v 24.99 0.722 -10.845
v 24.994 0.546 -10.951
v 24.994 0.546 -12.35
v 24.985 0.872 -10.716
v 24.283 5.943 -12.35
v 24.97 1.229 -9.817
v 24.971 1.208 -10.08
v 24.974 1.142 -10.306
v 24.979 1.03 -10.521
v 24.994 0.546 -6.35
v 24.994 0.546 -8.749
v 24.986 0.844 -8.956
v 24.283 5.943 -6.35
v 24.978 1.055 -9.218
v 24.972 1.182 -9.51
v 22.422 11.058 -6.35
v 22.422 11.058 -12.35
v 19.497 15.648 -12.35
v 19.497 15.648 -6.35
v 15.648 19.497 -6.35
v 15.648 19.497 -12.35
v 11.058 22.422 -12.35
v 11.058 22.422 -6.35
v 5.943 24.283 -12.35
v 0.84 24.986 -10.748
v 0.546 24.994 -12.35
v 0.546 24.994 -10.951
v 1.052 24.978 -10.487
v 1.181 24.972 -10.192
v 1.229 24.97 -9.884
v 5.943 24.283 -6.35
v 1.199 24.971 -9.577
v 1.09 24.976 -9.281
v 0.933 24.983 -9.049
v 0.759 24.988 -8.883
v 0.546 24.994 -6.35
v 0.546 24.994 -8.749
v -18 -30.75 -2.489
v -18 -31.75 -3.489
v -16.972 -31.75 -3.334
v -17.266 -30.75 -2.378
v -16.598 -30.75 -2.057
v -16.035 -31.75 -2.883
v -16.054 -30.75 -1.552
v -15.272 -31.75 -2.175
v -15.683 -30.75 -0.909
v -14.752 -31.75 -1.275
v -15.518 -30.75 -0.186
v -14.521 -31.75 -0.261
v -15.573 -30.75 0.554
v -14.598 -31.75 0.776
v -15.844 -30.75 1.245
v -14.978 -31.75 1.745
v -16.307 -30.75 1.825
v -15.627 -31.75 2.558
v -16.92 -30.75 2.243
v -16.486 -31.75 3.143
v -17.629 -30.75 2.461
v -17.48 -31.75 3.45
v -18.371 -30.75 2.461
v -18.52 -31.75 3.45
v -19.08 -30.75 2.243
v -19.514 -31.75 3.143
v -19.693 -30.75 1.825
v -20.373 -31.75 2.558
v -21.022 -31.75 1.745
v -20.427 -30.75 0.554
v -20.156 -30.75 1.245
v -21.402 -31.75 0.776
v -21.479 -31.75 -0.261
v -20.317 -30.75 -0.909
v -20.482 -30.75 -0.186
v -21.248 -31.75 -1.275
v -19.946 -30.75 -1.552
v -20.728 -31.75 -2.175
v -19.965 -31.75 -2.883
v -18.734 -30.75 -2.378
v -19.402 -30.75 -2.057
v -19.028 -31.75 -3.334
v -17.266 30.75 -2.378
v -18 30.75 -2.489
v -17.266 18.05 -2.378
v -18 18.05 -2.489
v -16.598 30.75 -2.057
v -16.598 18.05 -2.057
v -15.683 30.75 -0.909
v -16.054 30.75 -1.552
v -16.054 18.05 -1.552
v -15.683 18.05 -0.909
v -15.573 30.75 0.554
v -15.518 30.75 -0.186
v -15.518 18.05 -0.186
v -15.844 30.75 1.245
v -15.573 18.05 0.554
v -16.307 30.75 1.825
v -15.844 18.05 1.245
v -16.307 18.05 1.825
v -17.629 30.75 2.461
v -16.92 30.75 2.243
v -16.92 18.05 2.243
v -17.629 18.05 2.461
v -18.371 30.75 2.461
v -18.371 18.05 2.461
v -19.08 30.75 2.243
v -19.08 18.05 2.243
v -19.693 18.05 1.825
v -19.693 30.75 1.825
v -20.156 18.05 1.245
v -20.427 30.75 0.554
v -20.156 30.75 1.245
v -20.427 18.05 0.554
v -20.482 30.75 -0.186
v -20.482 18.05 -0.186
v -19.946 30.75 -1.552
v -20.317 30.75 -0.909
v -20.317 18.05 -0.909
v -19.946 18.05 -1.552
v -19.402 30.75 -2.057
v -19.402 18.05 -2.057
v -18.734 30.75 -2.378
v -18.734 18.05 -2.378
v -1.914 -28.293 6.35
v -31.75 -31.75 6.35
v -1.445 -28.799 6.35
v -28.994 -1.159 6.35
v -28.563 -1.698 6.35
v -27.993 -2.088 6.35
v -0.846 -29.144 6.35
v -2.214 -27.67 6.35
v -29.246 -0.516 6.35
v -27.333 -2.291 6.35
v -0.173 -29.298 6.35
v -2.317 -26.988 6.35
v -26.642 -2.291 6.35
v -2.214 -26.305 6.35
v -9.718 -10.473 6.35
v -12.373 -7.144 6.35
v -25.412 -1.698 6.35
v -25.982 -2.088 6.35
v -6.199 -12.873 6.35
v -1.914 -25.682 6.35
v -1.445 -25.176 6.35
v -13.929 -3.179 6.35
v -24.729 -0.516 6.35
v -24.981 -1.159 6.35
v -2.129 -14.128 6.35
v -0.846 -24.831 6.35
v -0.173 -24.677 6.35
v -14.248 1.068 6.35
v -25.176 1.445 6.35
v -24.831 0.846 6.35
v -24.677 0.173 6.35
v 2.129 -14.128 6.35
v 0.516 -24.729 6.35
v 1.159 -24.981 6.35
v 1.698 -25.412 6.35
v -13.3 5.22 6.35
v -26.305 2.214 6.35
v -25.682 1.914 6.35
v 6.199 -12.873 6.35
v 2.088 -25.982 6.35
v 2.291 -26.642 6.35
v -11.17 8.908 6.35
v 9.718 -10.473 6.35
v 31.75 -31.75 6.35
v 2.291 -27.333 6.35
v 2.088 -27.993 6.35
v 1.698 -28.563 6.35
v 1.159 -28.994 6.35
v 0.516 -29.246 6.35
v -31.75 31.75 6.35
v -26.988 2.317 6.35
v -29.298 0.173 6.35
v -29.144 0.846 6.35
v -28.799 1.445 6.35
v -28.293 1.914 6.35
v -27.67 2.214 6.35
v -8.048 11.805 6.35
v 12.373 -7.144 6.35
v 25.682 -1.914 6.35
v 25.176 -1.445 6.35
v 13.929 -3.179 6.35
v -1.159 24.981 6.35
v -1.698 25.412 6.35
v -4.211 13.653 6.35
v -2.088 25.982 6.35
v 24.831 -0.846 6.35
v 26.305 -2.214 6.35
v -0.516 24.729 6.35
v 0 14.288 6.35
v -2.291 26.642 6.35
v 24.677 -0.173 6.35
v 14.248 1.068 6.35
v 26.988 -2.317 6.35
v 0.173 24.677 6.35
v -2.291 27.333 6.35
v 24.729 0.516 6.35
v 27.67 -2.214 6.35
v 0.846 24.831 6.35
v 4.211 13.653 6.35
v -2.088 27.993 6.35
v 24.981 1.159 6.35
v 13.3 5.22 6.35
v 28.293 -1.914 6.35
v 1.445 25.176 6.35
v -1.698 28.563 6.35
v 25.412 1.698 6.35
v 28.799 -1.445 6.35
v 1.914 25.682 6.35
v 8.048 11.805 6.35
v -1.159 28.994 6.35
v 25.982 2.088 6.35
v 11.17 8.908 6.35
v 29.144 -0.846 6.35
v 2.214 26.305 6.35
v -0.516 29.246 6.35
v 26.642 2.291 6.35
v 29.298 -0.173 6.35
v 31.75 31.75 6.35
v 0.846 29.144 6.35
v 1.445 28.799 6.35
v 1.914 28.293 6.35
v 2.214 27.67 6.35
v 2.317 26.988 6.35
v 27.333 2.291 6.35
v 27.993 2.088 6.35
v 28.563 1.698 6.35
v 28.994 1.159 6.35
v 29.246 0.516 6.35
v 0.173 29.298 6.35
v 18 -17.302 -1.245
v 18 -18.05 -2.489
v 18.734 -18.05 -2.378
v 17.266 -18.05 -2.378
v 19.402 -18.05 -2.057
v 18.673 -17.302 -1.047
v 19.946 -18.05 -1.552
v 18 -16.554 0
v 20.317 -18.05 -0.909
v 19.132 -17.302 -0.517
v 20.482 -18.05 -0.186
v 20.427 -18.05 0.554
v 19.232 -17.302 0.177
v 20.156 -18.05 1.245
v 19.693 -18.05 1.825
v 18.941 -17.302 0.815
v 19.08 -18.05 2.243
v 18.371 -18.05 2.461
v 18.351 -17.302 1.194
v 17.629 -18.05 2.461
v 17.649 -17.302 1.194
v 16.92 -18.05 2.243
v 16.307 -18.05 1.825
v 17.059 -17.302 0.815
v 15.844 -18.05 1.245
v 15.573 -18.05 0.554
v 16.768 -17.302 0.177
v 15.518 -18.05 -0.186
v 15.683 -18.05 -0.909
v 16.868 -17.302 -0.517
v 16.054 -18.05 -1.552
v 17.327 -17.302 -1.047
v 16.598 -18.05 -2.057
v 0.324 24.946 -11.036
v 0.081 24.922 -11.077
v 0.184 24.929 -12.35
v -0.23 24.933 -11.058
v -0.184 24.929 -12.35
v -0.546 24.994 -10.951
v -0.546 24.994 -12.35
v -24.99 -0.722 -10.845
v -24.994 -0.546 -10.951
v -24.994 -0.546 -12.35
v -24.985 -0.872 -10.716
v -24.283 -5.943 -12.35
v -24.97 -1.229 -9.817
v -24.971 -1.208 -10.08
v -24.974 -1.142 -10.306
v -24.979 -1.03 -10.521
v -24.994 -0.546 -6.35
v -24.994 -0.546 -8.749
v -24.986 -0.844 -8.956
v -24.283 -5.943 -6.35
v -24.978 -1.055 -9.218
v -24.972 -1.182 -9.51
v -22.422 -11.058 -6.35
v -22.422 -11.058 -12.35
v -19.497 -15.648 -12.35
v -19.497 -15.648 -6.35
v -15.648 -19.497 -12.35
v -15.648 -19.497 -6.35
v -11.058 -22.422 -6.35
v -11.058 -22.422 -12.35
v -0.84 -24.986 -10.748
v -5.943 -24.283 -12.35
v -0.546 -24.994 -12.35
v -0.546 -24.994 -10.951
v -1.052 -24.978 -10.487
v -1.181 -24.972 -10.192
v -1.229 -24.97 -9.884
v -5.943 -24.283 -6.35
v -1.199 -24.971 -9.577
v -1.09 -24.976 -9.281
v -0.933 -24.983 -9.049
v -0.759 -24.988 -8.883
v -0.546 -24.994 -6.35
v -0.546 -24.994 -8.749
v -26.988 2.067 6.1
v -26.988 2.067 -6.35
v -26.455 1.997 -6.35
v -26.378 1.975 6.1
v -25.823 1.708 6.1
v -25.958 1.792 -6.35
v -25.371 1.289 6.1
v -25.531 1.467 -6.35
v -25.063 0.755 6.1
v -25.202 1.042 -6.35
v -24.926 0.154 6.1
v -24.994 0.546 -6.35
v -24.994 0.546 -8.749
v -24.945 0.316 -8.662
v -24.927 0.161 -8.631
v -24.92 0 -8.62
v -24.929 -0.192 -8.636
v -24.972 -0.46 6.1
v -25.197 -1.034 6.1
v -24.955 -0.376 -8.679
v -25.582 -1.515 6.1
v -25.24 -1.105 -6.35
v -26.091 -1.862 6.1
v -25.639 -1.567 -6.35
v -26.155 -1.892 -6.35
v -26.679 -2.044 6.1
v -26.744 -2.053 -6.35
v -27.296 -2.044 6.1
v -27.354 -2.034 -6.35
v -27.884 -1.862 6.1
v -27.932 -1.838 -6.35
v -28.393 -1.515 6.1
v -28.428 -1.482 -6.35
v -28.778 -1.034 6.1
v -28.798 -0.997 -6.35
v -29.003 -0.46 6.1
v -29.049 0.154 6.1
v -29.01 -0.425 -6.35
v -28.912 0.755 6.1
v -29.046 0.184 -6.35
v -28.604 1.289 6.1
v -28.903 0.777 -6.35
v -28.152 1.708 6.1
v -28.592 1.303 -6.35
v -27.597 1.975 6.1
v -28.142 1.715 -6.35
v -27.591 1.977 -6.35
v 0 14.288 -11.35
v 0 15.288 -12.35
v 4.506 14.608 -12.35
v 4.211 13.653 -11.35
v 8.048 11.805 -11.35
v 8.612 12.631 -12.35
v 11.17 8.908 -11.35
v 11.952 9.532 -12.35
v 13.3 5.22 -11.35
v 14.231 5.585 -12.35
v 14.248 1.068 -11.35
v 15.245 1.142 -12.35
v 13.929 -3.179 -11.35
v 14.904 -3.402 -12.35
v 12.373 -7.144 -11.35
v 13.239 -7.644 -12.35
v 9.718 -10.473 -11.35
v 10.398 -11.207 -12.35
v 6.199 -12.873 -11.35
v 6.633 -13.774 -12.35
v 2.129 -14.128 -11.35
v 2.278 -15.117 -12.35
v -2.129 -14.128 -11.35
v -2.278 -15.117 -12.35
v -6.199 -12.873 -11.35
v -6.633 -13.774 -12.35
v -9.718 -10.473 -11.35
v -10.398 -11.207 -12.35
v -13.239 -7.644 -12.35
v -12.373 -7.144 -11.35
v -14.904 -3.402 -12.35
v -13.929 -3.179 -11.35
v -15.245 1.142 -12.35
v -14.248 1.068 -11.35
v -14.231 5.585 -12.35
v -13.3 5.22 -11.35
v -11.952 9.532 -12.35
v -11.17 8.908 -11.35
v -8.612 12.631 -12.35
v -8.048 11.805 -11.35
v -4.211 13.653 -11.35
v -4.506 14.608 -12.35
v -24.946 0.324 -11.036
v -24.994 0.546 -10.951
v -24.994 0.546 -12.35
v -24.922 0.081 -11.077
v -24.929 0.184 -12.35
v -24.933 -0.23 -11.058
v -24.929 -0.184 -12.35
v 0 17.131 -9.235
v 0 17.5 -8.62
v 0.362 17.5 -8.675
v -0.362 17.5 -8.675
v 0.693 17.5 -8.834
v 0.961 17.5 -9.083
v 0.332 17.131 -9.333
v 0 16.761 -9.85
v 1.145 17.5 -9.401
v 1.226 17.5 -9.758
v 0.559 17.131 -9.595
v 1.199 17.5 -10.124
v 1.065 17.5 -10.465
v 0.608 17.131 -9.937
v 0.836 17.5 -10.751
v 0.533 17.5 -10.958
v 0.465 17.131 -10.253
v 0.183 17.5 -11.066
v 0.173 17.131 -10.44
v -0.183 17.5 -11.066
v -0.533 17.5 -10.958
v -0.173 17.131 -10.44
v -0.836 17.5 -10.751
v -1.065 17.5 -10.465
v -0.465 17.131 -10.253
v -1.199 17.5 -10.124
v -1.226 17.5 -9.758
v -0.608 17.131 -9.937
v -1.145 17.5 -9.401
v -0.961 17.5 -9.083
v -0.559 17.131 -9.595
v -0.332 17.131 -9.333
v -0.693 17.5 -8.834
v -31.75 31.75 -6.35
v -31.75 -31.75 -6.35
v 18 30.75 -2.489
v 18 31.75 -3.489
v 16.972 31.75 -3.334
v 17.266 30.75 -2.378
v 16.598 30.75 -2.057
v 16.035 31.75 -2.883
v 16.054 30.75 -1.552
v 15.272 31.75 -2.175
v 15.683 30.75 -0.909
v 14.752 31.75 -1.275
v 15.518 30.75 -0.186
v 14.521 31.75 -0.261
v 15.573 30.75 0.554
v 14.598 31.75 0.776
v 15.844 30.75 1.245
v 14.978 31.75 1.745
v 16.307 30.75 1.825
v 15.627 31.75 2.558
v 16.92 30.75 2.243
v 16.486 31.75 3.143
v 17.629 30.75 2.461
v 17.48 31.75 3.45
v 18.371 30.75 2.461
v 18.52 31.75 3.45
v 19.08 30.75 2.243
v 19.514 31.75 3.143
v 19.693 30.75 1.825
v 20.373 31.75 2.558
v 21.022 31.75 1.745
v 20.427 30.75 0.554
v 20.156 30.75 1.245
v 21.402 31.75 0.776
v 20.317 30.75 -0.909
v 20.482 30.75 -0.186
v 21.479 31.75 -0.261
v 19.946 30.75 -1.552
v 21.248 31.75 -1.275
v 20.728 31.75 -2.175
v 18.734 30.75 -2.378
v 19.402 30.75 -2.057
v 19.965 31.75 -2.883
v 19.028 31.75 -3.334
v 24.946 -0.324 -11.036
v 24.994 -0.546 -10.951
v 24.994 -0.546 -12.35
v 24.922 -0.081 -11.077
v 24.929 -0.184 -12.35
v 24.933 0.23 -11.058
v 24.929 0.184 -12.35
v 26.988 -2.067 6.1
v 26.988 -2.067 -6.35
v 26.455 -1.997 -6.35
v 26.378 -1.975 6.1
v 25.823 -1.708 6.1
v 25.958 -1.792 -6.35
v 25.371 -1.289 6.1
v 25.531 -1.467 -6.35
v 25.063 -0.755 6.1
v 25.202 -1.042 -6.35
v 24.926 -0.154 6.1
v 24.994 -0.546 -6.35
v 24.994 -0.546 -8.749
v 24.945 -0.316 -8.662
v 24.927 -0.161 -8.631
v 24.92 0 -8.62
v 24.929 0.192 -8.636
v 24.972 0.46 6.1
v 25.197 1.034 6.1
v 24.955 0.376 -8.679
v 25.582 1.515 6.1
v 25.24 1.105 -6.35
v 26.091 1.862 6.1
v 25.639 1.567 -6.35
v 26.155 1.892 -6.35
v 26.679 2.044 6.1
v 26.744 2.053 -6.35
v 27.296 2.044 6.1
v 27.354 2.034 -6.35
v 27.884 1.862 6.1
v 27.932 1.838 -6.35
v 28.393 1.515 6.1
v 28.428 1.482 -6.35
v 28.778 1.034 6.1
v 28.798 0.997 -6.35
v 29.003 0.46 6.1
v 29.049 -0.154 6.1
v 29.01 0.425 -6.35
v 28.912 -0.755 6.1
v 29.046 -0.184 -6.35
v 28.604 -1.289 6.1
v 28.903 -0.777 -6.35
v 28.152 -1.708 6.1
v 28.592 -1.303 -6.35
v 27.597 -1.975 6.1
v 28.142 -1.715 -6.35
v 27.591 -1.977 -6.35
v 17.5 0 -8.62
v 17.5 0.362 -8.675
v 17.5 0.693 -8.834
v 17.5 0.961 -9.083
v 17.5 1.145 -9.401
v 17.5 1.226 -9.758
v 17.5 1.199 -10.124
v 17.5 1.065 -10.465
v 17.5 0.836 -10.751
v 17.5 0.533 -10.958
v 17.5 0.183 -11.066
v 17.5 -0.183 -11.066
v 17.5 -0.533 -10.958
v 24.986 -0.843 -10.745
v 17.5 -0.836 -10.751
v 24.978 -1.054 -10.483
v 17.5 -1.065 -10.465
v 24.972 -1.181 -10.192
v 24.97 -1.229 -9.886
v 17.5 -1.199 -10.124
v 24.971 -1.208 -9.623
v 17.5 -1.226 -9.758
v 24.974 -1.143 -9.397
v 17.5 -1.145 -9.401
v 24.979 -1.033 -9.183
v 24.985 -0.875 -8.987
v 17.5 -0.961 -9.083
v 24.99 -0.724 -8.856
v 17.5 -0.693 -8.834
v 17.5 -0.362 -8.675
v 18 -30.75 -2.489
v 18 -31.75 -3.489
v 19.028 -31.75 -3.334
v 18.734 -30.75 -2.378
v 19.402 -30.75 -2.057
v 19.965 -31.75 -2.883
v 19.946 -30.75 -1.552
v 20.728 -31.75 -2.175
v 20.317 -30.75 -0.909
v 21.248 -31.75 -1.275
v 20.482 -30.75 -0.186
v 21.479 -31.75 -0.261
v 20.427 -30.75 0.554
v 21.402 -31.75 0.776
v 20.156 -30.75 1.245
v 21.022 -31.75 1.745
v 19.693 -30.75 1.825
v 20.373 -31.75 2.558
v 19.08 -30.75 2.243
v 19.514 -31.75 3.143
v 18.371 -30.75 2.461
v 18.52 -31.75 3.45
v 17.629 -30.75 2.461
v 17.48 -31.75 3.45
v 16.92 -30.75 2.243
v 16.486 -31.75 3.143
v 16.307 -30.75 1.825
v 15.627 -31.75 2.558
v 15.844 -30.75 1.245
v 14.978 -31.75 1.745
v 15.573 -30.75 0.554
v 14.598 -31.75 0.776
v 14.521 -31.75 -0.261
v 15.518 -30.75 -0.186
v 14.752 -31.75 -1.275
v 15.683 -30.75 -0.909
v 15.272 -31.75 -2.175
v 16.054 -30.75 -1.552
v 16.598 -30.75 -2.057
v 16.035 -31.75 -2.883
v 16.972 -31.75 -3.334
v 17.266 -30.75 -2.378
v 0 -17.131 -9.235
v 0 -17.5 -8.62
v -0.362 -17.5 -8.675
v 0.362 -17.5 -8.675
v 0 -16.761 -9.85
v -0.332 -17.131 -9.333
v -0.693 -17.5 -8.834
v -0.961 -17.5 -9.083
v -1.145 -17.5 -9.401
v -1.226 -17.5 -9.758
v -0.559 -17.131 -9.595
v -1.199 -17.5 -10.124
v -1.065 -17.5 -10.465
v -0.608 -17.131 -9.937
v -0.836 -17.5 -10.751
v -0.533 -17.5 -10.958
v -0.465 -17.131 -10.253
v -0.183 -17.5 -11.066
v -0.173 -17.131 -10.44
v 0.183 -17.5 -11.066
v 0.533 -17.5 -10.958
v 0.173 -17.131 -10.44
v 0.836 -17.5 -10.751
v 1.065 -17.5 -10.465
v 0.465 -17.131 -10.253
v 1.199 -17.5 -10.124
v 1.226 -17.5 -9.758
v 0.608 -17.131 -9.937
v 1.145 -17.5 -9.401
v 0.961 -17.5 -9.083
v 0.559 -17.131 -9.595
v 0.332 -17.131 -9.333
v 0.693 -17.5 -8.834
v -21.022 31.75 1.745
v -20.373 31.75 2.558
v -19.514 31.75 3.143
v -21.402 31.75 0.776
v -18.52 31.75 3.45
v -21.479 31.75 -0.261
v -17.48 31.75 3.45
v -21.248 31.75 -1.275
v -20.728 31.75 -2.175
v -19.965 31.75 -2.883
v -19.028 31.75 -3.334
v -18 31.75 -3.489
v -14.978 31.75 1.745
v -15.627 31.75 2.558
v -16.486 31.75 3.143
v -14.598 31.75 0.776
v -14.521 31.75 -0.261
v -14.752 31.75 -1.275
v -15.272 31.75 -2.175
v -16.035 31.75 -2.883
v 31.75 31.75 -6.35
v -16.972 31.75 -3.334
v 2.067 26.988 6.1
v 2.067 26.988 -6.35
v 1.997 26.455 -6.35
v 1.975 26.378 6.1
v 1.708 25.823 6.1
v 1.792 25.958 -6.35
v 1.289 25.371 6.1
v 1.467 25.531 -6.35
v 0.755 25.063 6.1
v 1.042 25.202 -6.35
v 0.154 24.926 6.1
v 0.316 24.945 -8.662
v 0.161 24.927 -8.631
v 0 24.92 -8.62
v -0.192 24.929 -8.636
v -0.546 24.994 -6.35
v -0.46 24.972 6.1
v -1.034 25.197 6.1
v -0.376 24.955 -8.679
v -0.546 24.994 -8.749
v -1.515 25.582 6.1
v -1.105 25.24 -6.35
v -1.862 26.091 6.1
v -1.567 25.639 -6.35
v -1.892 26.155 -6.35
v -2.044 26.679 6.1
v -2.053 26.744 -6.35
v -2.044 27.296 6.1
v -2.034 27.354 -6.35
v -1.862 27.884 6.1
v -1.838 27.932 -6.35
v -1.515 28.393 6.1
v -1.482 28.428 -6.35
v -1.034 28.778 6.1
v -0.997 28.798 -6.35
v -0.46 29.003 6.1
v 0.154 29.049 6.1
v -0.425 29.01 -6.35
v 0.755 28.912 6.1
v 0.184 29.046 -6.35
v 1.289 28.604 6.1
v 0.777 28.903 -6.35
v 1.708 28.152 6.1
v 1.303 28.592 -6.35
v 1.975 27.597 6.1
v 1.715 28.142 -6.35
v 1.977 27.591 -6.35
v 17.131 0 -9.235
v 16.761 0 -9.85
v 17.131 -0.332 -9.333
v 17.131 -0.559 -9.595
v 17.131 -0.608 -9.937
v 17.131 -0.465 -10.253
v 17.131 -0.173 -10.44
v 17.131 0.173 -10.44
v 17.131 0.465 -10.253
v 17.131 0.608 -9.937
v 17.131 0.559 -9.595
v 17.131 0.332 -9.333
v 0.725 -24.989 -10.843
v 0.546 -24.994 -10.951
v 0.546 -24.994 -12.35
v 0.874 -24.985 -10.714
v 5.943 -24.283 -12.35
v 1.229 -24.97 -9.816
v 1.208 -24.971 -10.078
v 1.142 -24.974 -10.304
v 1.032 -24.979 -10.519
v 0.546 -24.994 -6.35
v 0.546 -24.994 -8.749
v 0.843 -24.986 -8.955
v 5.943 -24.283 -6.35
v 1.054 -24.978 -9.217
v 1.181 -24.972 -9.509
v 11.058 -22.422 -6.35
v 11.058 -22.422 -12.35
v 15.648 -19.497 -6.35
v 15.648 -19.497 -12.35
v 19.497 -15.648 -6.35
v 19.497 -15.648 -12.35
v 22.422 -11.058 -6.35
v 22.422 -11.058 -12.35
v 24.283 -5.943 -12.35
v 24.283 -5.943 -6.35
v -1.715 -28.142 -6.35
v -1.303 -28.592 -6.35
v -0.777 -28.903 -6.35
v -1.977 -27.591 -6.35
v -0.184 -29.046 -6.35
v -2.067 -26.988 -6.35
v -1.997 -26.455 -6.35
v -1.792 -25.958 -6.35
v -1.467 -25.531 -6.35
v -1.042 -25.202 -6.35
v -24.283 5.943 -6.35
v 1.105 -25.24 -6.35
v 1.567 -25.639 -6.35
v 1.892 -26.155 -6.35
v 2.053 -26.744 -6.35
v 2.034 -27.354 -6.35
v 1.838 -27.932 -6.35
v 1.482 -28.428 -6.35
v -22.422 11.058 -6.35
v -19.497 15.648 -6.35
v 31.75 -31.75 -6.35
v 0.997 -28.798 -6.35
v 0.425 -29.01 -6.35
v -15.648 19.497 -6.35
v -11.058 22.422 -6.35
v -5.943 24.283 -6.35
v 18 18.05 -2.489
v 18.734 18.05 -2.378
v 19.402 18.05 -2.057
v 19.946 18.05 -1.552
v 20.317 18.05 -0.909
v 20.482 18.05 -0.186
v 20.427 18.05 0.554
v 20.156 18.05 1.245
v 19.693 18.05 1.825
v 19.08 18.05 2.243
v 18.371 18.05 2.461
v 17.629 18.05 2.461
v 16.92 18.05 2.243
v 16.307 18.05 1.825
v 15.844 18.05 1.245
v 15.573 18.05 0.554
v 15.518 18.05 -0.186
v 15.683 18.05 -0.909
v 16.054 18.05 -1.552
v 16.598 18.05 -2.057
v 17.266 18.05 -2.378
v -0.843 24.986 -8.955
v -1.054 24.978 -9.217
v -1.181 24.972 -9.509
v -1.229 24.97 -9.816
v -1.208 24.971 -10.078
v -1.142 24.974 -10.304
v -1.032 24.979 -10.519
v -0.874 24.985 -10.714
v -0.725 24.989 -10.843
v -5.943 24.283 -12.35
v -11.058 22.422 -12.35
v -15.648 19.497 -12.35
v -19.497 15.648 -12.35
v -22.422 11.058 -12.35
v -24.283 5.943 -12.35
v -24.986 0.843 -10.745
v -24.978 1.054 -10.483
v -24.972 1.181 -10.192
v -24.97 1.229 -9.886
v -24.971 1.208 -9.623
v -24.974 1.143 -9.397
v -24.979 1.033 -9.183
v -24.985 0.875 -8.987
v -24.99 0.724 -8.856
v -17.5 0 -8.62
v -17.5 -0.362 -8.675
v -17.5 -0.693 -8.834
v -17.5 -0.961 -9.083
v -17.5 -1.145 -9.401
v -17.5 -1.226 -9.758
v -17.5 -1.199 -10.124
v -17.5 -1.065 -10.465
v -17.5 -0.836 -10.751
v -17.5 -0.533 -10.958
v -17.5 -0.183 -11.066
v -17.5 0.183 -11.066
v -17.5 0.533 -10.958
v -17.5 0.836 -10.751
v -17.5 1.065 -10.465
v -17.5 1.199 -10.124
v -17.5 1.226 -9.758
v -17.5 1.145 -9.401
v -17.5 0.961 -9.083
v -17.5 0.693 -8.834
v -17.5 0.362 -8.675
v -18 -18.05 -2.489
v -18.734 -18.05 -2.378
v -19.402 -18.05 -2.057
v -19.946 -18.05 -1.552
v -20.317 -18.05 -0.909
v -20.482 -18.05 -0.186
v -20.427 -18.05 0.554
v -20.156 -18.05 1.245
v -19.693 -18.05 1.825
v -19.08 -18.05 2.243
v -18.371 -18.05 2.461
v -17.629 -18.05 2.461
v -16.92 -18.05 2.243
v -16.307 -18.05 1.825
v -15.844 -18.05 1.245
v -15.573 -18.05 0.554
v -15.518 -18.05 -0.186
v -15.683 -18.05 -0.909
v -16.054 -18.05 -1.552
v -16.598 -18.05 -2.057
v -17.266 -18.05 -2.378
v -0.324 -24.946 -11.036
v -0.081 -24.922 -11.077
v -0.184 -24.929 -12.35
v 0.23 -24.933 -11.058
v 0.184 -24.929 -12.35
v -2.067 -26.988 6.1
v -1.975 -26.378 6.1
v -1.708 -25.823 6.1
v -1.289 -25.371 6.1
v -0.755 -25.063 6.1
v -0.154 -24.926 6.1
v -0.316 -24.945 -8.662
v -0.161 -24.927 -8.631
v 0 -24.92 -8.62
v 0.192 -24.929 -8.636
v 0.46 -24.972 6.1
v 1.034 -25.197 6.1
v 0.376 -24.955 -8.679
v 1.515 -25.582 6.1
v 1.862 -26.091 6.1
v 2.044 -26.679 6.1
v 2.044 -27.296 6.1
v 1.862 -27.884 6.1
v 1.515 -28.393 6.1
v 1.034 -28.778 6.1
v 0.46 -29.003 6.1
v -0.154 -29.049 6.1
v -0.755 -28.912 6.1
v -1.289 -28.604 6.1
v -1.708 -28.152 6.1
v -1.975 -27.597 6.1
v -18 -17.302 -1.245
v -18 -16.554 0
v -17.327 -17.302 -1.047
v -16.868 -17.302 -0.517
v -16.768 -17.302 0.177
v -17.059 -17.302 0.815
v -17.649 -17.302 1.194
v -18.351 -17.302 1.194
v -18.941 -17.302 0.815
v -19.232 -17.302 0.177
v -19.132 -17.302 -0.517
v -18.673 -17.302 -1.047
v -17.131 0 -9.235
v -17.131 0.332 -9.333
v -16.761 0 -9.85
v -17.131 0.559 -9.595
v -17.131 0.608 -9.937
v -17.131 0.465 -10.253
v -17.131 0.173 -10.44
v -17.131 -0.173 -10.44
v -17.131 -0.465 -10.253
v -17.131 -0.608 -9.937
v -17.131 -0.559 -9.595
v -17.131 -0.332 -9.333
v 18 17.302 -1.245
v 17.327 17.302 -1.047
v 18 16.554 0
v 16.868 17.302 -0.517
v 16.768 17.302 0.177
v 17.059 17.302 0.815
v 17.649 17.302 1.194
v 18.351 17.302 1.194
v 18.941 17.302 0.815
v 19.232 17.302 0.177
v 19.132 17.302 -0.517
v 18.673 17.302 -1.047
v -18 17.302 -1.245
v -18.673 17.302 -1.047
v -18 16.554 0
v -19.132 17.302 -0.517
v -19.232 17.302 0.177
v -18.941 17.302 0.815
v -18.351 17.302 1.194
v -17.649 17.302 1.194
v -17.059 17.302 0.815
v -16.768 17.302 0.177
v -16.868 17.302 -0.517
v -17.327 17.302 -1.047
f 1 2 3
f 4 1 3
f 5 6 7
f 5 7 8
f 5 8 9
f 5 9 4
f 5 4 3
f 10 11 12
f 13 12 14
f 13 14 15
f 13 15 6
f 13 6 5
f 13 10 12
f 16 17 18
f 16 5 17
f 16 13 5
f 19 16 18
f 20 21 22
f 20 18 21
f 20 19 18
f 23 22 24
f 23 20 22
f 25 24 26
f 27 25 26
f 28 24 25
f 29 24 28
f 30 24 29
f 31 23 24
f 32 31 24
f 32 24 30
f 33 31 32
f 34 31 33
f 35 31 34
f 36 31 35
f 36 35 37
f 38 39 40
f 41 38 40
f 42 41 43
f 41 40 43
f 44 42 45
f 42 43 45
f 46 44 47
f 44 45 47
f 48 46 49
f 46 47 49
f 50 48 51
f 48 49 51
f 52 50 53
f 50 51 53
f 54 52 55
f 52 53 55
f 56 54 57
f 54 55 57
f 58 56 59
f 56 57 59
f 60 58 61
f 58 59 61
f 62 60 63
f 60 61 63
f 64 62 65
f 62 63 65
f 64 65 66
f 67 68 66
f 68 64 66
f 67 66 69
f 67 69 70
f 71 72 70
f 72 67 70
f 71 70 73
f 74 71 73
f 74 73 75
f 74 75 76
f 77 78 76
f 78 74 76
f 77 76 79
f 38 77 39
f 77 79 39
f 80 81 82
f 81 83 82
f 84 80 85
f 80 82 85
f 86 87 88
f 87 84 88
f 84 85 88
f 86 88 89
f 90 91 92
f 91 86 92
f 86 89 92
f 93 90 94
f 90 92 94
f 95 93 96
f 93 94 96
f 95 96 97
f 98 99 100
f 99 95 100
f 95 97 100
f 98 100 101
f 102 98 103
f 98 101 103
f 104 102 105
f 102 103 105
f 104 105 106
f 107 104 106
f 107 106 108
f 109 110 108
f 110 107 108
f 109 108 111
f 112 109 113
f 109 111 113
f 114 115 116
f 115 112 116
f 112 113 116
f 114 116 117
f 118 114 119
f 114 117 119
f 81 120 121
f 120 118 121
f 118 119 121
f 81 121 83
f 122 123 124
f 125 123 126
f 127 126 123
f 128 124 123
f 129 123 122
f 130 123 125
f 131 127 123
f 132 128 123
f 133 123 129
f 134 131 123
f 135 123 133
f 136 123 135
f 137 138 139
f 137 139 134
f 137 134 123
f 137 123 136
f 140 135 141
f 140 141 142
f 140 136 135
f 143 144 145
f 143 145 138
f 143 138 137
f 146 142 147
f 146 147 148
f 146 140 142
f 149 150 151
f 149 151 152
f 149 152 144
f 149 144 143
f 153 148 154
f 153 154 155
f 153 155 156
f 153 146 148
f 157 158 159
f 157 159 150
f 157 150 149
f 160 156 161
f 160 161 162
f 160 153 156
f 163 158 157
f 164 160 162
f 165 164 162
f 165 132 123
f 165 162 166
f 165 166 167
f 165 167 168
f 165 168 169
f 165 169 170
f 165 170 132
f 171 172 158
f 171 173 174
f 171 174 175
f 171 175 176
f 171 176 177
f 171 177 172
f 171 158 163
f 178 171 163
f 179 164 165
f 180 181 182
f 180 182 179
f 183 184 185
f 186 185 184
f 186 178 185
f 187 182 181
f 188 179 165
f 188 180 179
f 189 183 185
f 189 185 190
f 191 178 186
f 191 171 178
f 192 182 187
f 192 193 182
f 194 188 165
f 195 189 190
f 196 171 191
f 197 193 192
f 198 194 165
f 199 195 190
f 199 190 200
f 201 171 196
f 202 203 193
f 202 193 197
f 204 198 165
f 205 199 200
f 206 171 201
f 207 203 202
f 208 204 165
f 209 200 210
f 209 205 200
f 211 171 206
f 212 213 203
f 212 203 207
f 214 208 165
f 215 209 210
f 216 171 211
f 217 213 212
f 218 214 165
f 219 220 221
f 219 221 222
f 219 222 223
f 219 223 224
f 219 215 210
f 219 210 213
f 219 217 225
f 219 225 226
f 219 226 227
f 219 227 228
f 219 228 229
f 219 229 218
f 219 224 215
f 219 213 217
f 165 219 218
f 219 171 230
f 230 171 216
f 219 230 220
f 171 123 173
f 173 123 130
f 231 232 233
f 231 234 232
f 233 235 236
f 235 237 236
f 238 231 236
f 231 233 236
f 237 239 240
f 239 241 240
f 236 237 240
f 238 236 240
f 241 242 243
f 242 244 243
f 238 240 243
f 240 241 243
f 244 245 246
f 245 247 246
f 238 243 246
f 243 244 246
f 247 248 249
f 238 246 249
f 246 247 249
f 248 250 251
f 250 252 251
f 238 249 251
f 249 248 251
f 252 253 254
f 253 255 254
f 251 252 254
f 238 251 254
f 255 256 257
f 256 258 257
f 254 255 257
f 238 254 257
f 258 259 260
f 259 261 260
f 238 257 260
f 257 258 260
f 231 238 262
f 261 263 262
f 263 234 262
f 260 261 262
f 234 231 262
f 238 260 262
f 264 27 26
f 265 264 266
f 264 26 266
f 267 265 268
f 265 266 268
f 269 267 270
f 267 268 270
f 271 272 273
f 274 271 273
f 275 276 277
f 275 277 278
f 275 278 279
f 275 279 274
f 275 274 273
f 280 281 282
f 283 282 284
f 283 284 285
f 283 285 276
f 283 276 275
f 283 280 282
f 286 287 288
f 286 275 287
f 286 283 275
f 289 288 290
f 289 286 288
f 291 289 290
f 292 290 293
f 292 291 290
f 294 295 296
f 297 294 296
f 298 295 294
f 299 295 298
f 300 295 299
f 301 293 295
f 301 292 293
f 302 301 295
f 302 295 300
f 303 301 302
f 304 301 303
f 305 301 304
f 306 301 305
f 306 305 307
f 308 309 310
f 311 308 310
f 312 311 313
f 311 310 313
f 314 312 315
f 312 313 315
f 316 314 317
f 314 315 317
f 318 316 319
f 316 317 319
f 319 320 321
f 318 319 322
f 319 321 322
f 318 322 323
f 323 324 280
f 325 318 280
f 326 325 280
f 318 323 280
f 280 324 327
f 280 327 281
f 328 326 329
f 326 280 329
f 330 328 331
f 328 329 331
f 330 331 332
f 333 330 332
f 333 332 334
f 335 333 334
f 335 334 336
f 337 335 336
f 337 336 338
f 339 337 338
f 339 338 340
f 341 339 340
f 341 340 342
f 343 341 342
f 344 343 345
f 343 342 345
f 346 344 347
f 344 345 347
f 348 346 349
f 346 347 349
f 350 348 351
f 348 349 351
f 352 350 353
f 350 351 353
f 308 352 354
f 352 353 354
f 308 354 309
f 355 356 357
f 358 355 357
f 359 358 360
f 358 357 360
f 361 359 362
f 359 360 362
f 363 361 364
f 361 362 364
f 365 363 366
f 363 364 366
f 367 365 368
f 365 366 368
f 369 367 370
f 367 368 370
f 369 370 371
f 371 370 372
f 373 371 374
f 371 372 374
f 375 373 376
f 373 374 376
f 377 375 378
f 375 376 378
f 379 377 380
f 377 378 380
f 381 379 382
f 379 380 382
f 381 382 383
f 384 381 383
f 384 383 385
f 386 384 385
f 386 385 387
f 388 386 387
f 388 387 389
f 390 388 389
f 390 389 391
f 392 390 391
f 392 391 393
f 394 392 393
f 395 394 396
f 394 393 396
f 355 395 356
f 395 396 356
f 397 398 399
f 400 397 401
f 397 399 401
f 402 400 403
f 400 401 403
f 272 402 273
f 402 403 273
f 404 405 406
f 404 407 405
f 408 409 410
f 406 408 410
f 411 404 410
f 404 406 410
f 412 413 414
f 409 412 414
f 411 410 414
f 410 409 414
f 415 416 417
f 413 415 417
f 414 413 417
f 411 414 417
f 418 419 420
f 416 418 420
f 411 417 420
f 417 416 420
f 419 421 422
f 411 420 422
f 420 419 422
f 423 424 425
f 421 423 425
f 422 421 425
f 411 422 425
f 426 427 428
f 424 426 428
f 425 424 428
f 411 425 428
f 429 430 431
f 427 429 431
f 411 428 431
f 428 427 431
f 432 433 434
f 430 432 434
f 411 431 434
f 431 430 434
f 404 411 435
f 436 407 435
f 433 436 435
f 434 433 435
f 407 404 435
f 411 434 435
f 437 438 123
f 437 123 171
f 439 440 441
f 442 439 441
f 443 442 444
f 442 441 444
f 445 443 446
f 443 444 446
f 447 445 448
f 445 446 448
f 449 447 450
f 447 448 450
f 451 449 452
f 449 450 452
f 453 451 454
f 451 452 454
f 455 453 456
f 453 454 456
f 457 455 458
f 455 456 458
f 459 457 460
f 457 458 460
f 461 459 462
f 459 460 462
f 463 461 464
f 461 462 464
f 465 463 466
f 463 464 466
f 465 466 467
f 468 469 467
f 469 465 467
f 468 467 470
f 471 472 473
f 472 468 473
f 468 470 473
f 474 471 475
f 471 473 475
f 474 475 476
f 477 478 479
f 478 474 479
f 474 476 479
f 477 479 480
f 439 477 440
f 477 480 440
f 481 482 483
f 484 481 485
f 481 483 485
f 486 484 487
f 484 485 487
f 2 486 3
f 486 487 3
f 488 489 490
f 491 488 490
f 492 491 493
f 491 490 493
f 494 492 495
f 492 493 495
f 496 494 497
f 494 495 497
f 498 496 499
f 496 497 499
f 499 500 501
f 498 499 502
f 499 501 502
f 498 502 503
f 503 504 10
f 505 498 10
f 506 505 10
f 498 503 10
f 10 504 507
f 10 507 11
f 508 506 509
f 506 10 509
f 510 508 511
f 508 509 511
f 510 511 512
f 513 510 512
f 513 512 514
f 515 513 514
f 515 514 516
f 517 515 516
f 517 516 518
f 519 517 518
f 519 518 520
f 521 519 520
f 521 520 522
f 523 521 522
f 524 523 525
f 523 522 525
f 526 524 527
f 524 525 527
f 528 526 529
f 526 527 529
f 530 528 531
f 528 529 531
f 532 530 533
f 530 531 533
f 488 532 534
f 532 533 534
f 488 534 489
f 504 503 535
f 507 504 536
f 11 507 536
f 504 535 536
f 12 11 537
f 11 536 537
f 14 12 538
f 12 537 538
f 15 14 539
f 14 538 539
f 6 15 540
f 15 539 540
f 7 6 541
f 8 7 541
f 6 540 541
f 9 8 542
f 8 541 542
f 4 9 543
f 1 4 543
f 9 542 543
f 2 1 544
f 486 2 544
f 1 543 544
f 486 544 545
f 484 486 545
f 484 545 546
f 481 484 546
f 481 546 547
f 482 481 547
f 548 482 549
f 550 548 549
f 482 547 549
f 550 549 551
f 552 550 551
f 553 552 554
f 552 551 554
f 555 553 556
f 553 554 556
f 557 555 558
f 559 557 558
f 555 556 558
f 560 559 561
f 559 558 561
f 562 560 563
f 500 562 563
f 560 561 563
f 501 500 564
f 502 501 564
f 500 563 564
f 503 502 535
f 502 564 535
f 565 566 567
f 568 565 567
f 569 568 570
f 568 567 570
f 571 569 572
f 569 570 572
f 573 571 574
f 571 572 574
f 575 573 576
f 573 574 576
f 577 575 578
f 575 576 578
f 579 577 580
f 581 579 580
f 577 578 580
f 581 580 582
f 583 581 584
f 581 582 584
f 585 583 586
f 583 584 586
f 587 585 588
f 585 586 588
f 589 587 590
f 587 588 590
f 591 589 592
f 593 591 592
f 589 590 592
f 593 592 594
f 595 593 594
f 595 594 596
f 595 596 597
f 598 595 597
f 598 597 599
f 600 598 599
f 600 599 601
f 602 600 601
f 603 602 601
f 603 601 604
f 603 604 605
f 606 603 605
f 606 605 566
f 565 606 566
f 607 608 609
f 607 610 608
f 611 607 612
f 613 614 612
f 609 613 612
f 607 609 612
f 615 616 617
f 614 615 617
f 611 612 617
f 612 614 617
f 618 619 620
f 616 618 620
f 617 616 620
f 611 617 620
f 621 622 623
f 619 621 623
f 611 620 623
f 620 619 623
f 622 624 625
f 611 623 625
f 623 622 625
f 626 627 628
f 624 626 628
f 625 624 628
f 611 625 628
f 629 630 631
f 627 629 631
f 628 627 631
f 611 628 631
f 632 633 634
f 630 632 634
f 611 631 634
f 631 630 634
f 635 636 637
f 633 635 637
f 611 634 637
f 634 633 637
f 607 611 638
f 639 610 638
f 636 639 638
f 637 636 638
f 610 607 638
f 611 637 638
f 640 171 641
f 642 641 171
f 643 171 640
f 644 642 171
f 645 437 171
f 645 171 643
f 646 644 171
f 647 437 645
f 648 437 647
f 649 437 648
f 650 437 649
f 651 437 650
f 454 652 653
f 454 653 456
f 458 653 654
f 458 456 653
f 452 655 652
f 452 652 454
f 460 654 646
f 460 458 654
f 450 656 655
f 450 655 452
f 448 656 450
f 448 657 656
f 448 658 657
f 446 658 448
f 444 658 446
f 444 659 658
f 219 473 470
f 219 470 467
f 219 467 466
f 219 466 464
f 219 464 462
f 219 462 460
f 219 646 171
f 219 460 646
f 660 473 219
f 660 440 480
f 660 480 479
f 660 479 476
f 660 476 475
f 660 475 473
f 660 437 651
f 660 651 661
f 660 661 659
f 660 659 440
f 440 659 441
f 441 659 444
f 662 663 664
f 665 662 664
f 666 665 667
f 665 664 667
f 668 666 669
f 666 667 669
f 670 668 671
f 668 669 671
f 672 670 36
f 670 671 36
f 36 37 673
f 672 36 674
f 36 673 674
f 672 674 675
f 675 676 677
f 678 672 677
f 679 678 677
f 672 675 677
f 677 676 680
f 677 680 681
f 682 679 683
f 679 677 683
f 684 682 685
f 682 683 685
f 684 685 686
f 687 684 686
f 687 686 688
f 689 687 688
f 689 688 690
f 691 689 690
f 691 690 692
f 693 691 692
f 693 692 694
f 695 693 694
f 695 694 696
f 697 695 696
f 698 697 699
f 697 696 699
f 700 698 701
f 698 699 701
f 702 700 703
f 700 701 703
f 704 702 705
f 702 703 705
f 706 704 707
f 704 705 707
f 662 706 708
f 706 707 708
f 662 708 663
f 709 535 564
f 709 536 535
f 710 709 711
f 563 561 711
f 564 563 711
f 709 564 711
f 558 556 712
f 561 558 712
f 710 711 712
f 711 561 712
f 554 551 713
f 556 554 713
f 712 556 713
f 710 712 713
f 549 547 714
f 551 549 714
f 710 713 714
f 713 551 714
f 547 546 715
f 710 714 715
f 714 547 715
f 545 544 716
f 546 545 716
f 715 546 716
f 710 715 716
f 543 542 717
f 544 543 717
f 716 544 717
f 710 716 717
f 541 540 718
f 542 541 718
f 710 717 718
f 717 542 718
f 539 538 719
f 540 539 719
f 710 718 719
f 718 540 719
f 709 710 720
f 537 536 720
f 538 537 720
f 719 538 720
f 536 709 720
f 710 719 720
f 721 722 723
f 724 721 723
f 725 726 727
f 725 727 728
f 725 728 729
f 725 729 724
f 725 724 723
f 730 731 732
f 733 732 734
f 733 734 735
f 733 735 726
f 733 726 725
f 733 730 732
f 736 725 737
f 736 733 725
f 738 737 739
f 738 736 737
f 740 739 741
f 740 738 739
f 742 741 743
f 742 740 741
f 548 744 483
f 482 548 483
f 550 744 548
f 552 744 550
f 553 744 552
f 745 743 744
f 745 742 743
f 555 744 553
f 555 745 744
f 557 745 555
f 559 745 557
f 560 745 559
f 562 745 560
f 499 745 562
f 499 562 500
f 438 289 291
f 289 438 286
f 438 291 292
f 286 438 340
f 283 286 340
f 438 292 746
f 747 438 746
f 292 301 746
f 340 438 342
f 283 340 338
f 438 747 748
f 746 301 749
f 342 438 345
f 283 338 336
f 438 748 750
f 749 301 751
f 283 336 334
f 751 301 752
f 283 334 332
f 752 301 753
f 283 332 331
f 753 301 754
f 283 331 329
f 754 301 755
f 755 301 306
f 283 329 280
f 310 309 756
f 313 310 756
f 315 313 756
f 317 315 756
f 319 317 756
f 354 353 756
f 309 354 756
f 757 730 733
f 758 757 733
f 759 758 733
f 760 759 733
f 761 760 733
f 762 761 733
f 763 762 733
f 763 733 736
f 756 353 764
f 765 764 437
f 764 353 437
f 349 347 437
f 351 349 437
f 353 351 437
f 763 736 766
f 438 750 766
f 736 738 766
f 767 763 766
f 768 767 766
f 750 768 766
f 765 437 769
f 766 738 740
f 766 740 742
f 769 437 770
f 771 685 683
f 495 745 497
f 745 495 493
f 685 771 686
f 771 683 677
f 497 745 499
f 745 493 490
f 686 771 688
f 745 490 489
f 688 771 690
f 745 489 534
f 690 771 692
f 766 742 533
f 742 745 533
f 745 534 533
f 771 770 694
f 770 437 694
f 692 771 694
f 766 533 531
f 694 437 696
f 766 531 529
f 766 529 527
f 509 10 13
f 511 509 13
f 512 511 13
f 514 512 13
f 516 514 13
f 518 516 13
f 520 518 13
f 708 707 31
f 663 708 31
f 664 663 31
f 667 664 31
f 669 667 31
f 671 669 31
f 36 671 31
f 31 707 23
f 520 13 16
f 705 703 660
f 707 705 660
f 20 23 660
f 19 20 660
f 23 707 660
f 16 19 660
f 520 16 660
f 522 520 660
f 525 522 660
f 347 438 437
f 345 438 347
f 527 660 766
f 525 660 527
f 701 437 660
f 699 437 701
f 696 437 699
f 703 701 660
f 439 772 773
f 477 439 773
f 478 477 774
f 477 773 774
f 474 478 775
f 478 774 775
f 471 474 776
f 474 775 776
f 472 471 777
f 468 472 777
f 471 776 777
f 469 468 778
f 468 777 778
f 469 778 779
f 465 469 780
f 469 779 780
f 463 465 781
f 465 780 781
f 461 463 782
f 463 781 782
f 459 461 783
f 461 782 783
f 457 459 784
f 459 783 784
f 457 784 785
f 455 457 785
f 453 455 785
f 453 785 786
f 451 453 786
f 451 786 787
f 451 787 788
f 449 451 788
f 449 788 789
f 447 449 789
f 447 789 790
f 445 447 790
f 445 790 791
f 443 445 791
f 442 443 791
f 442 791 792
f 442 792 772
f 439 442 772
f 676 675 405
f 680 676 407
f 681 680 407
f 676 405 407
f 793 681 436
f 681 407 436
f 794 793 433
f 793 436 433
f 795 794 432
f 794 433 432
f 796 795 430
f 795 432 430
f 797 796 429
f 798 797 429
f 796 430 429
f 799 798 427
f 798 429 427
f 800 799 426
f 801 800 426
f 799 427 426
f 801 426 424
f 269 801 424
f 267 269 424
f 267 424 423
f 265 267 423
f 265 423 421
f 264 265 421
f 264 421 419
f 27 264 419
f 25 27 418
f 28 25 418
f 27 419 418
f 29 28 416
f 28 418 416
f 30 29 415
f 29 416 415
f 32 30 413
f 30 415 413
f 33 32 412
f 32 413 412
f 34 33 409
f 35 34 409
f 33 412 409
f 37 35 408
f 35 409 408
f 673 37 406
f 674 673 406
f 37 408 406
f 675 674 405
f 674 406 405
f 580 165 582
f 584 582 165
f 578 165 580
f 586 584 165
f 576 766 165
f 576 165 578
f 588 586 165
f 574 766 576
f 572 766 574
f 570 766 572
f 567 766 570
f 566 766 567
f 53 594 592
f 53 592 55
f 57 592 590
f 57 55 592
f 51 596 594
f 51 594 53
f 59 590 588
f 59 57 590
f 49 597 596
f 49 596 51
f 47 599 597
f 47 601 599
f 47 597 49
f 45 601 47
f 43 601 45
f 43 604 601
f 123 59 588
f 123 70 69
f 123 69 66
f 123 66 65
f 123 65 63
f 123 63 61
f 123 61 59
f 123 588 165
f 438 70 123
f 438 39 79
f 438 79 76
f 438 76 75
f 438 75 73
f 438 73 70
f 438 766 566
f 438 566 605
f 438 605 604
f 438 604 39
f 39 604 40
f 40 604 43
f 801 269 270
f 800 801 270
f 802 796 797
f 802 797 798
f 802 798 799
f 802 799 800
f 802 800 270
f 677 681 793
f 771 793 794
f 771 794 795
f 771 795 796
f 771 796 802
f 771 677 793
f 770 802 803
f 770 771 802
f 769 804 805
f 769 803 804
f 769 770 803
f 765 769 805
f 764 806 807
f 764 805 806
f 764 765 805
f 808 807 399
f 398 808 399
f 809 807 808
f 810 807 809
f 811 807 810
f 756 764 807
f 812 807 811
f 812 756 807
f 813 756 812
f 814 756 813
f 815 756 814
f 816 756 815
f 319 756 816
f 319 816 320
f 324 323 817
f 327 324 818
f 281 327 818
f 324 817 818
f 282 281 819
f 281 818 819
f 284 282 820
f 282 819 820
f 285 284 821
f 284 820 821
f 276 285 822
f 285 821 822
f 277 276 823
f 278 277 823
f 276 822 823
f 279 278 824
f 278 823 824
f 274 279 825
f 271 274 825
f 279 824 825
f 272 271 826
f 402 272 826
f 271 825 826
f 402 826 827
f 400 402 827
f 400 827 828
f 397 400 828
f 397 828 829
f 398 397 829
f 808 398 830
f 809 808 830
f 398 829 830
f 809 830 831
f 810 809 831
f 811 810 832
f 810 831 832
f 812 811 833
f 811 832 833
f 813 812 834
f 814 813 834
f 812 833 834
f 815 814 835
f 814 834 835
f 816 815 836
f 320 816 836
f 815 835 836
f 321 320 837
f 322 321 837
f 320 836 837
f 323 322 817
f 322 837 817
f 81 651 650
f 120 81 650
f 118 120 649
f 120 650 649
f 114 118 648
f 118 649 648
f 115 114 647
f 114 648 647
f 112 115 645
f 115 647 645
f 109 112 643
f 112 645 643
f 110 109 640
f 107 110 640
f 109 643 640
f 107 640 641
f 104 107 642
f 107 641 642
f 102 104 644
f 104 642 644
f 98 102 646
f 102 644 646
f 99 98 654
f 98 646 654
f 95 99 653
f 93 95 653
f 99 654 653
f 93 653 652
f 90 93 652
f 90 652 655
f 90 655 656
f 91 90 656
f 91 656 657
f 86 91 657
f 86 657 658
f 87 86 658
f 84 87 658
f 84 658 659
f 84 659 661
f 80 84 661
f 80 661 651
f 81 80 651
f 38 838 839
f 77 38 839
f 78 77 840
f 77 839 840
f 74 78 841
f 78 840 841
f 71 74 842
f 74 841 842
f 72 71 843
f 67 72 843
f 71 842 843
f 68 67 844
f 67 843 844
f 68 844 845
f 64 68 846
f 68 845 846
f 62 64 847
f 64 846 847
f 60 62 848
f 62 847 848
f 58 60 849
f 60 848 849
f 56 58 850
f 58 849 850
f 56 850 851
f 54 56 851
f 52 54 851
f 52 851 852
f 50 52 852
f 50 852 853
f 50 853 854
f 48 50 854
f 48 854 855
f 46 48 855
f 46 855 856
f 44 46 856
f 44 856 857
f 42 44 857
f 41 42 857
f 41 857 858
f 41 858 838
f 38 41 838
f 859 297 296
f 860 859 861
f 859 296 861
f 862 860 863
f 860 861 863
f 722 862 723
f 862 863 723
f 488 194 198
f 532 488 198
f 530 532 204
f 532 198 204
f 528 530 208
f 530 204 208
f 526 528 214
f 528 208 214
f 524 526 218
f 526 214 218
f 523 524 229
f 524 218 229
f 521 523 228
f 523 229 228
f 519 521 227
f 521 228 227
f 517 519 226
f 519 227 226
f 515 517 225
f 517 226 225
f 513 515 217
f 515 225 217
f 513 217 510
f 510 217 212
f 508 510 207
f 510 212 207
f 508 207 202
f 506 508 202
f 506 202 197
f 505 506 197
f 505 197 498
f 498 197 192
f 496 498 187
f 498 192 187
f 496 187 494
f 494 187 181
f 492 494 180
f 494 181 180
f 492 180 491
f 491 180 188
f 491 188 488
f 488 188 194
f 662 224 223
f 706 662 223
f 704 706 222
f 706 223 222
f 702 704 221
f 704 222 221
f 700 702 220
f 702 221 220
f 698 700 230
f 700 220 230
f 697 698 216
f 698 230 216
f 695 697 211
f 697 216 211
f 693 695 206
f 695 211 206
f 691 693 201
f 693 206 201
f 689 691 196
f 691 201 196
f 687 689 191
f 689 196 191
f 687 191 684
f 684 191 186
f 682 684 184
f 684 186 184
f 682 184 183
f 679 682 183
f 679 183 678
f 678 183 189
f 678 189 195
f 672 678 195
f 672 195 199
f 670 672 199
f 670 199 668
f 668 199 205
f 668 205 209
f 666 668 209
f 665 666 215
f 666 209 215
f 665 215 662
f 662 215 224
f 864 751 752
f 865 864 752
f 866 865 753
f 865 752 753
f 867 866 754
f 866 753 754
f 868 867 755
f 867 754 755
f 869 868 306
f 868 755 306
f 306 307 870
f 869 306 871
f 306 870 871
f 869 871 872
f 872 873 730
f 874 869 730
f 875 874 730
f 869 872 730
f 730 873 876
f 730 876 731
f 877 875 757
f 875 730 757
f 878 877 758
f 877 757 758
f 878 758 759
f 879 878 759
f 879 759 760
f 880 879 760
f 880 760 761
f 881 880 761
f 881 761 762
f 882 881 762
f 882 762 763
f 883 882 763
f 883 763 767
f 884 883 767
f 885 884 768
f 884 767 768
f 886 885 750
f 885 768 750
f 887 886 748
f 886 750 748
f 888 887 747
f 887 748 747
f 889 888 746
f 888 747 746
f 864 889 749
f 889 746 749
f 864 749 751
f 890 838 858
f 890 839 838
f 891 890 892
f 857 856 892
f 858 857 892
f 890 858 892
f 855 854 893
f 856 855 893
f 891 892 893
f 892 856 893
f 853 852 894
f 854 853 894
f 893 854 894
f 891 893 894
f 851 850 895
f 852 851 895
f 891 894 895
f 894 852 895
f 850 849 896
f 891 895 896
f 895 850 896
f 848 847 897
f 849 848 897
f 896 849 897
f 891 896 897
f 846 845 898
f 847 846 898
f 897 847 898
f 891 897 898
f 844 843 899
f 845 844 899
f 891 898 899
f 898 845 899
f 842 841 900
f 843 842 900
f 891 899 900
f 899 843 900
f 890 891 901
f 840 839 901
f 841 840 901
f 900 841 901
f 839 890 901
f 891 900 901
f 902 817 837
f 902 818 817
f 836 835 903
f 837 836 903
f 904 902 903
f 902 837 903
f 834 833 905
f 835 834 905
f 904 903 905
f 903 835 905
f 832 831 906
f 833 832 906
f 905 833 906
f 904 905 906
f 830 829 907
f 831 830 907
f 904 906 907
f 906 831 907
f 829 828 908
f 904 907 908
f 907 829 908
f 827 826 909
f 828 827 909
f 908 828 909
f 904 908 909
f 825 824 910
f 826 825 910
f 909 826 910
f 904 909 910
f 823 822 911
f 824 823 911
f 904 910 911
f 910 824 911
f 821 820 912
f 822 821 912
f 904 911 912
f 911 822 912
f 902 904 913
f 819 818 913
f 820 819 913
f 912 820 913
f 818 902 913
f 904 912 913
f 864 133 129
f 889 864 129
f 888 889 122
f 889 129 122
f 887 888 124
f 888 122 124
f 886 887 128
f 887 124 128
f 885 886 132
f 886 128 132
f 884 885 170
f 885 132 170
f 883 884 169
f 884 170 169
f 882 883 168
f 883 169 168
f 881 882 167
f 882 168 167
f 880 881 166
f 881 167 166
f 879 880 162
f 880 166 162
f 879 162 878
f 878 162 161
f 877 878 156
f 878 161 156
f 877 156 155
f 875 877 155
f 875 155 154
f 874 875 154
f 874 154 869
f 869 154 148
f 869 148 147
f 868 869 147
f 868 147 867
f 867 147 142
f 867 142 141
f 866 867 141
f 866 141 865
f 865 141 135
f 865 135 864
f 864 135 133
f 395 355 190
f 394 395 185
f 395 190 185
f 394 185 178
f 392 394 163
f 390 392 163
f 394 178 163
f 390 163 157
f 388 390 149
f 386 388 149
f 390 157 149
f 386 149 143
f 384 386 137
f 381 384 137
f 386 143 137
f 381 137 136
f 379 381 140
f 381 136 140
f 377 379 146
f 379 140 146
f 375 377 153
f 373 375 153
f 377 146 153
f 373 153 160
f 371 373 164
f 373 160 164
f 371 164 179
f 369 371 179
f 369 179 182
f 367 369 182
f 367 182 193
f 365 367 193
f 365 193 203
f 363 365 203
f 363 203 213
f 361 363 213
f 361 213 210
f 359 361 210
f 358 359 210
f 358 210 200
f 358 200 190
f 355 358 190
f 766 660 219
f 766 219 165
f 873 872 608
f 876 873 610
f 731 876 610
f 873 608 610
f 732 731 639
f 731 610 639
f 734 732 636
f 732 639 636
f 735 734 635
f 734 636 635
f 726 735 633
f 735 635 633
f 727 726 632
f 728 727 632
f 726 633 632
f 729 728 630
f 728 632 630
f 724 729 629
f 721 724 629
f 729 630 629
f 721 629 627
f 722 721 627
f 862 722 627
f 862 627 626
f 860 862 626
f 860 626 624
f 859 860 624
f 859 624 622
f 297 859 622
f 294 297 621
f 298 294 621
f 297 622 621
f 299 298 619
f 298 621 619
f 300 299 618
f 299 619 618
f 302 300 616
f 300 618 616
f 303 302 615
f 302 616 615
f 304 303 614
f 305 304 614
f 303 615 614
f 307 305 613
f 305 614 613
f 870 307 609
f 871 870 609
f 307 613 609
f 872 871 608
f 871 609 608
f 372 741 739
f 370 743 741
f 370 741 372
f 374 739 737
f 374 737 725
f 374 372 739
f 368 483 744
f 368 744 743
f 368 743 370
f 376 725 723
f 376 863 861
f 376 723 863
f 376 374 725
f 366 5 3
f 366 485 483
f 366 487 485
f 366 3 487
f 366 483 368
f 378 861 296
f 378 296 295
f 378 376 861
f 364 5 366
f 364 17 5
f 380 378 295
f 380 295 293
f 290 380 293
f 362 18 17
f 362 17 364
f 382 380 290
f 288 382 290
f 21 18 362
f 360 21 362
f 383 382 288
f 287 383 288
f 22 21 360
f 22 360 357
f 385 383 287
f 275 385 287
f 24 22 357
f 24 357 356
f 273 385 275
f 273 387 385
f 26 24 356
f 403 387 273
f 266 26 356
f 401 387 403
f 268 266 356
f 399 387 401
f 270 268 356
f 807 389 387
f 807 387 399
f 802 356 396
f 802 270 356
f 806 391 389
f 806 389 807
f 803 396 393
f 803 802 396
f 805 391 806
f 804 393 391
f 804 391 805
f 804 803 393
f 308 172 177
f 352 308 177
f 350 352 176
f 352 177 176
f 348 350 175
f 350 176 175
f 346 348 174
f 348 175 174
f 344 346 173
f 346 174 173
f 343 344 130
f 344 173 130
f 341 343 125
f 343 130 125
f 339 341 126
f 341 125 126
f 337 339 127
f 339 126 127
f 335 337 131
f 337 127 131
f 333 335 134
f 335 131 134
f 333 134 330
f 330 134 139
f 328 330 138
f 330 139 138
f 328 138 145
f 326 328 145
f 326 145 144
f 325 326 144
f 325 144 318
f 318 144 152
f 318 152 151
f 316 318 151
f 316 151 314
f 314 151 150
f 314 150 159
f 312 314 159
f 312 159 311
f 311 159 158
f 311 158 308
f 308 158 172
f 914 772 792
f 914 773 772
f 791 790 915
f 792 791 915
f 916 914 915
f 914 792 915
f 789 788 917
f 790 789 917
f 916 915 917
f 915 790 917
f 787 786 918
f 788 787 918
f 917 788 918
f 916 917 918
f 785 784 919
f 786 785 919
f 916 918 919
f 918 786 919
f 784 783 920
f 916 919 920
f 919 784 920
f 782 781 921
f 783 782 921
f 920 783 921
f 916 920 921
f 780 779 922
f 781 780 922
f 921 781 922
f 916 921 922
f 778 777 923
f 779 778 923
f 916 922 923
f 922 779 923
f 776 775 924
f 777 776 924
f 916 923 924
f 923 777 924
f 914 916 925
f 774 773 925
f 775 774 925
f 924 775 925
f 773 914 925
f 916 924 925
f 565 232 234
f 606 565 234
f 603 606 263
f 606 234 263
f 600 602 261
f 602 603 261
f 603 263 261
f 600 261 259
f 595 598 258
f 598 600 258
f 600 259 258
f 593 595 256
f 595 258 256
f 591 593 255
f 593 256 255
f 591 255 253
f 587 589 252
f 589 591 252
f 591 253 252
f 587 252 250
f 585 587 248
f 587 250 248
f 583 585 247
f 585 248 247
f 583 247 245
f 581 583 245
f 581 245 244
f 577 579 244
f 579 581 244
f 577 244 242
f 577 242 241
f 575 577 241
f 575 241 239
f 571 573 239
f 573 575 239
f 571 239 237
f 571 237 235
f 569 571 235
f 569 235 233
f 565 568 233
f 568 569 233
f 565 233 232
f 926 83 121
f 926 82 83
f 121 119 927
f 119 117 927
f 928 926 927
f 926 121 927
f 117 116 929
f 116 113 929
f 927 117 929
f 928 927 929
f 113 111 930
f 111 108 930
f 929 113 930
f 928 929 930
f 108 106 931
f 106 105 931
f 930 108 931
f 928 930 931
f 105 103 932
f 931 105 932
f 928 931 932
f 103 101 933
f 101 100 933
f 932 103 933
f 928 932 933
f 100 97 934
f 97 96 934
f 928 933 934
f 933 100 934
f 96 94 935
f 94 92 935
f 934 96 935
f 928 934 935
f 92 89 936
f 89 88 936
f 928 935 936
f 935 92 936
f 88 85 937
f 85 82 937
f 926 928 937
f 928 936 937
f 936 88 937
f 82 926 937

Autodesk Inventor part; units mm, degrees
ref_plane "YZ Plane" through (0, 0, 0) normal (1, 0, 0) x (0, 1, 0)
ref_plane "XZ Plane" through (0, 0, 0) normal (0, 1, 0) x (-1, 0, 0)
sketch "Sketch1" plane through (0, 0, 0) normal (0, 0, 1) x (1, 0, 0)
  line L0 (-31.75, 31.75) -> (31.75, 31.75)
  line L1 (31.75, 31.75) -> (31.75, -31.75)
  line L2 (31.75, -31.75) -> (-31.75, -31.75)
  line L3 (-31.75, -31.75) -> (-31.75, 31.75)
  line L4 (0, 0) -> (0, 31.75) construction
  line L5 (0, 0) -> (0, -31.75) construction
  line L6 (0, 0) -> (31.75, 0) construction
  line L7 (0, 0) -> (-31.75, 0) construction
  dimension "d0" = 63.5
  dimension "d1" = 63.5
extrude "Extrusion1" add sketch "Sketch1" along normal mid plane 12.7
sketch "Sketch6" plane through (0, 0, -6.35) normal (0, 0, -1) x (-1, 0, 0)
  circle A0 centre (0, 0) radius 25
  dimension "d13" = 50
extrude "Extrusion4" add sketch "Sketch6" along normal blind 6
sketch "Sketch8" plane through (0, 0, -12.35) normal (0, 0, -1) x (-1, 0, 0)
  circle A0 centre (0, 0) radius 25 projected
hole "Hole2" at (0, 0, -12.35) direction (0, 0, 1) diameter 28.575 end through all
chamfer "Chamfer1" distance 1 angle 45 1 edges at (0, -14.2875, -12.35)
sketch "Sketch9" plane through (-31.75, -31.75, 6.35) normal (0, -1, 0) x (1, 0, 0)
  line L0 (63.5, 0) -> (0, 0) projected
  line L1 (0, 0) -> (0, -12.7) projected
  line L2 (0, -12.7) -> (63.5, -12.7) projected
  line L3 (63.5, 0) -> (63.5, -12.7) projected
  line L4 (0, -6.35) -> (63.5, -6.35) construction
  line L5 (31.75, 0) -> (31.75, -12.7) construction
  point P0 (13.75, -6.35)
  dimension "d37" = 18
hole "Hole3" at (-18, -31.75, 0) direction (0, 1, 0) diameter 4.978 depth 13.7 tip angle 118 thread size "1/4-20 UNC" class "1B" standard "ANSI Unified Screw Threads"
mirror "Mirror1" about plane through (0, 0, 0) normal (1, 0, 0) of "Hole3"
mirror "Mirror2" about plane through (0, 0, 0) normal (0, 1, 0) of "Hole3", "Mirror1"
chamfer "Chamfer2" distance 1 angle 45 4 edges at (-18, -31.75, 2.489) (18, -31.75, 2.489) (-18, 31.75, 2.489) (18, 31.75, 2.489)
ref_plane "Work Plane1" through (0, 25, 0) normal (0, 1, 0) x (-1, 0, 0)
sketch "Sketch10" plane through (0, 25, 0) normal (0, 1, 0) x (-1, 0, 0)
  line L0 (-31.75, -6.35) -> (31.75, -6.35) projected
  line L1 (0, -6.35) -> (0, -22.9157) construction
  point P0 (0, -9.85)
  dimension "d48" = 3.5
hole "Hole4" at (0, 25, -9.85) direction (0, -1, 0) diameter 2.459 depth 7.5 tip angle 118 thread size "M3x0.5" class "6H" standard "ANSI Metric M Profile"
pattern_circular "Circular Pattern2" count 4 over 360 about axis through (0, 0, 79.3789) along (0, 0, -1) of "Hole4"
sketch "Sketch11" plane through (0, 0, 6.35) normal (0, 0, 1) x (1, 0, 0)
  circle A0 centre (0, 0) radius 14.2875 projected
  line L0 (31.75, -31.75) -> (-31.75, -31.75) projected
  line L1 (0, 0) -> (36.6411, 0) construction
  point P0 (26.9875, 0)
  dimension "d59" = 26.9875
hole "Hole5" at (26.9875, 0, 6.35) direction (0, 0, -1) diameter 4.134 end through all thread size "M5x0.8" class "6H" standard "ANSI Metric M Profile"
pattern_circular "Circular Pattern3" count 4 over 360 about axis through (0, 0, 79.3789) along (0, 0, -1) of "Hole5"
chamfer "Chamfer3" distance 0.25 angle 45 4 edges at (26.9875, 2.067, 6.35) (-2.067, 26.9875, 6.35) (-26.9875, -2.067, 6.35) (2.067, -26.9875, 6.35)
properties part number "BB2-FrontPlate" material "Aluminum-6061-AHC"
